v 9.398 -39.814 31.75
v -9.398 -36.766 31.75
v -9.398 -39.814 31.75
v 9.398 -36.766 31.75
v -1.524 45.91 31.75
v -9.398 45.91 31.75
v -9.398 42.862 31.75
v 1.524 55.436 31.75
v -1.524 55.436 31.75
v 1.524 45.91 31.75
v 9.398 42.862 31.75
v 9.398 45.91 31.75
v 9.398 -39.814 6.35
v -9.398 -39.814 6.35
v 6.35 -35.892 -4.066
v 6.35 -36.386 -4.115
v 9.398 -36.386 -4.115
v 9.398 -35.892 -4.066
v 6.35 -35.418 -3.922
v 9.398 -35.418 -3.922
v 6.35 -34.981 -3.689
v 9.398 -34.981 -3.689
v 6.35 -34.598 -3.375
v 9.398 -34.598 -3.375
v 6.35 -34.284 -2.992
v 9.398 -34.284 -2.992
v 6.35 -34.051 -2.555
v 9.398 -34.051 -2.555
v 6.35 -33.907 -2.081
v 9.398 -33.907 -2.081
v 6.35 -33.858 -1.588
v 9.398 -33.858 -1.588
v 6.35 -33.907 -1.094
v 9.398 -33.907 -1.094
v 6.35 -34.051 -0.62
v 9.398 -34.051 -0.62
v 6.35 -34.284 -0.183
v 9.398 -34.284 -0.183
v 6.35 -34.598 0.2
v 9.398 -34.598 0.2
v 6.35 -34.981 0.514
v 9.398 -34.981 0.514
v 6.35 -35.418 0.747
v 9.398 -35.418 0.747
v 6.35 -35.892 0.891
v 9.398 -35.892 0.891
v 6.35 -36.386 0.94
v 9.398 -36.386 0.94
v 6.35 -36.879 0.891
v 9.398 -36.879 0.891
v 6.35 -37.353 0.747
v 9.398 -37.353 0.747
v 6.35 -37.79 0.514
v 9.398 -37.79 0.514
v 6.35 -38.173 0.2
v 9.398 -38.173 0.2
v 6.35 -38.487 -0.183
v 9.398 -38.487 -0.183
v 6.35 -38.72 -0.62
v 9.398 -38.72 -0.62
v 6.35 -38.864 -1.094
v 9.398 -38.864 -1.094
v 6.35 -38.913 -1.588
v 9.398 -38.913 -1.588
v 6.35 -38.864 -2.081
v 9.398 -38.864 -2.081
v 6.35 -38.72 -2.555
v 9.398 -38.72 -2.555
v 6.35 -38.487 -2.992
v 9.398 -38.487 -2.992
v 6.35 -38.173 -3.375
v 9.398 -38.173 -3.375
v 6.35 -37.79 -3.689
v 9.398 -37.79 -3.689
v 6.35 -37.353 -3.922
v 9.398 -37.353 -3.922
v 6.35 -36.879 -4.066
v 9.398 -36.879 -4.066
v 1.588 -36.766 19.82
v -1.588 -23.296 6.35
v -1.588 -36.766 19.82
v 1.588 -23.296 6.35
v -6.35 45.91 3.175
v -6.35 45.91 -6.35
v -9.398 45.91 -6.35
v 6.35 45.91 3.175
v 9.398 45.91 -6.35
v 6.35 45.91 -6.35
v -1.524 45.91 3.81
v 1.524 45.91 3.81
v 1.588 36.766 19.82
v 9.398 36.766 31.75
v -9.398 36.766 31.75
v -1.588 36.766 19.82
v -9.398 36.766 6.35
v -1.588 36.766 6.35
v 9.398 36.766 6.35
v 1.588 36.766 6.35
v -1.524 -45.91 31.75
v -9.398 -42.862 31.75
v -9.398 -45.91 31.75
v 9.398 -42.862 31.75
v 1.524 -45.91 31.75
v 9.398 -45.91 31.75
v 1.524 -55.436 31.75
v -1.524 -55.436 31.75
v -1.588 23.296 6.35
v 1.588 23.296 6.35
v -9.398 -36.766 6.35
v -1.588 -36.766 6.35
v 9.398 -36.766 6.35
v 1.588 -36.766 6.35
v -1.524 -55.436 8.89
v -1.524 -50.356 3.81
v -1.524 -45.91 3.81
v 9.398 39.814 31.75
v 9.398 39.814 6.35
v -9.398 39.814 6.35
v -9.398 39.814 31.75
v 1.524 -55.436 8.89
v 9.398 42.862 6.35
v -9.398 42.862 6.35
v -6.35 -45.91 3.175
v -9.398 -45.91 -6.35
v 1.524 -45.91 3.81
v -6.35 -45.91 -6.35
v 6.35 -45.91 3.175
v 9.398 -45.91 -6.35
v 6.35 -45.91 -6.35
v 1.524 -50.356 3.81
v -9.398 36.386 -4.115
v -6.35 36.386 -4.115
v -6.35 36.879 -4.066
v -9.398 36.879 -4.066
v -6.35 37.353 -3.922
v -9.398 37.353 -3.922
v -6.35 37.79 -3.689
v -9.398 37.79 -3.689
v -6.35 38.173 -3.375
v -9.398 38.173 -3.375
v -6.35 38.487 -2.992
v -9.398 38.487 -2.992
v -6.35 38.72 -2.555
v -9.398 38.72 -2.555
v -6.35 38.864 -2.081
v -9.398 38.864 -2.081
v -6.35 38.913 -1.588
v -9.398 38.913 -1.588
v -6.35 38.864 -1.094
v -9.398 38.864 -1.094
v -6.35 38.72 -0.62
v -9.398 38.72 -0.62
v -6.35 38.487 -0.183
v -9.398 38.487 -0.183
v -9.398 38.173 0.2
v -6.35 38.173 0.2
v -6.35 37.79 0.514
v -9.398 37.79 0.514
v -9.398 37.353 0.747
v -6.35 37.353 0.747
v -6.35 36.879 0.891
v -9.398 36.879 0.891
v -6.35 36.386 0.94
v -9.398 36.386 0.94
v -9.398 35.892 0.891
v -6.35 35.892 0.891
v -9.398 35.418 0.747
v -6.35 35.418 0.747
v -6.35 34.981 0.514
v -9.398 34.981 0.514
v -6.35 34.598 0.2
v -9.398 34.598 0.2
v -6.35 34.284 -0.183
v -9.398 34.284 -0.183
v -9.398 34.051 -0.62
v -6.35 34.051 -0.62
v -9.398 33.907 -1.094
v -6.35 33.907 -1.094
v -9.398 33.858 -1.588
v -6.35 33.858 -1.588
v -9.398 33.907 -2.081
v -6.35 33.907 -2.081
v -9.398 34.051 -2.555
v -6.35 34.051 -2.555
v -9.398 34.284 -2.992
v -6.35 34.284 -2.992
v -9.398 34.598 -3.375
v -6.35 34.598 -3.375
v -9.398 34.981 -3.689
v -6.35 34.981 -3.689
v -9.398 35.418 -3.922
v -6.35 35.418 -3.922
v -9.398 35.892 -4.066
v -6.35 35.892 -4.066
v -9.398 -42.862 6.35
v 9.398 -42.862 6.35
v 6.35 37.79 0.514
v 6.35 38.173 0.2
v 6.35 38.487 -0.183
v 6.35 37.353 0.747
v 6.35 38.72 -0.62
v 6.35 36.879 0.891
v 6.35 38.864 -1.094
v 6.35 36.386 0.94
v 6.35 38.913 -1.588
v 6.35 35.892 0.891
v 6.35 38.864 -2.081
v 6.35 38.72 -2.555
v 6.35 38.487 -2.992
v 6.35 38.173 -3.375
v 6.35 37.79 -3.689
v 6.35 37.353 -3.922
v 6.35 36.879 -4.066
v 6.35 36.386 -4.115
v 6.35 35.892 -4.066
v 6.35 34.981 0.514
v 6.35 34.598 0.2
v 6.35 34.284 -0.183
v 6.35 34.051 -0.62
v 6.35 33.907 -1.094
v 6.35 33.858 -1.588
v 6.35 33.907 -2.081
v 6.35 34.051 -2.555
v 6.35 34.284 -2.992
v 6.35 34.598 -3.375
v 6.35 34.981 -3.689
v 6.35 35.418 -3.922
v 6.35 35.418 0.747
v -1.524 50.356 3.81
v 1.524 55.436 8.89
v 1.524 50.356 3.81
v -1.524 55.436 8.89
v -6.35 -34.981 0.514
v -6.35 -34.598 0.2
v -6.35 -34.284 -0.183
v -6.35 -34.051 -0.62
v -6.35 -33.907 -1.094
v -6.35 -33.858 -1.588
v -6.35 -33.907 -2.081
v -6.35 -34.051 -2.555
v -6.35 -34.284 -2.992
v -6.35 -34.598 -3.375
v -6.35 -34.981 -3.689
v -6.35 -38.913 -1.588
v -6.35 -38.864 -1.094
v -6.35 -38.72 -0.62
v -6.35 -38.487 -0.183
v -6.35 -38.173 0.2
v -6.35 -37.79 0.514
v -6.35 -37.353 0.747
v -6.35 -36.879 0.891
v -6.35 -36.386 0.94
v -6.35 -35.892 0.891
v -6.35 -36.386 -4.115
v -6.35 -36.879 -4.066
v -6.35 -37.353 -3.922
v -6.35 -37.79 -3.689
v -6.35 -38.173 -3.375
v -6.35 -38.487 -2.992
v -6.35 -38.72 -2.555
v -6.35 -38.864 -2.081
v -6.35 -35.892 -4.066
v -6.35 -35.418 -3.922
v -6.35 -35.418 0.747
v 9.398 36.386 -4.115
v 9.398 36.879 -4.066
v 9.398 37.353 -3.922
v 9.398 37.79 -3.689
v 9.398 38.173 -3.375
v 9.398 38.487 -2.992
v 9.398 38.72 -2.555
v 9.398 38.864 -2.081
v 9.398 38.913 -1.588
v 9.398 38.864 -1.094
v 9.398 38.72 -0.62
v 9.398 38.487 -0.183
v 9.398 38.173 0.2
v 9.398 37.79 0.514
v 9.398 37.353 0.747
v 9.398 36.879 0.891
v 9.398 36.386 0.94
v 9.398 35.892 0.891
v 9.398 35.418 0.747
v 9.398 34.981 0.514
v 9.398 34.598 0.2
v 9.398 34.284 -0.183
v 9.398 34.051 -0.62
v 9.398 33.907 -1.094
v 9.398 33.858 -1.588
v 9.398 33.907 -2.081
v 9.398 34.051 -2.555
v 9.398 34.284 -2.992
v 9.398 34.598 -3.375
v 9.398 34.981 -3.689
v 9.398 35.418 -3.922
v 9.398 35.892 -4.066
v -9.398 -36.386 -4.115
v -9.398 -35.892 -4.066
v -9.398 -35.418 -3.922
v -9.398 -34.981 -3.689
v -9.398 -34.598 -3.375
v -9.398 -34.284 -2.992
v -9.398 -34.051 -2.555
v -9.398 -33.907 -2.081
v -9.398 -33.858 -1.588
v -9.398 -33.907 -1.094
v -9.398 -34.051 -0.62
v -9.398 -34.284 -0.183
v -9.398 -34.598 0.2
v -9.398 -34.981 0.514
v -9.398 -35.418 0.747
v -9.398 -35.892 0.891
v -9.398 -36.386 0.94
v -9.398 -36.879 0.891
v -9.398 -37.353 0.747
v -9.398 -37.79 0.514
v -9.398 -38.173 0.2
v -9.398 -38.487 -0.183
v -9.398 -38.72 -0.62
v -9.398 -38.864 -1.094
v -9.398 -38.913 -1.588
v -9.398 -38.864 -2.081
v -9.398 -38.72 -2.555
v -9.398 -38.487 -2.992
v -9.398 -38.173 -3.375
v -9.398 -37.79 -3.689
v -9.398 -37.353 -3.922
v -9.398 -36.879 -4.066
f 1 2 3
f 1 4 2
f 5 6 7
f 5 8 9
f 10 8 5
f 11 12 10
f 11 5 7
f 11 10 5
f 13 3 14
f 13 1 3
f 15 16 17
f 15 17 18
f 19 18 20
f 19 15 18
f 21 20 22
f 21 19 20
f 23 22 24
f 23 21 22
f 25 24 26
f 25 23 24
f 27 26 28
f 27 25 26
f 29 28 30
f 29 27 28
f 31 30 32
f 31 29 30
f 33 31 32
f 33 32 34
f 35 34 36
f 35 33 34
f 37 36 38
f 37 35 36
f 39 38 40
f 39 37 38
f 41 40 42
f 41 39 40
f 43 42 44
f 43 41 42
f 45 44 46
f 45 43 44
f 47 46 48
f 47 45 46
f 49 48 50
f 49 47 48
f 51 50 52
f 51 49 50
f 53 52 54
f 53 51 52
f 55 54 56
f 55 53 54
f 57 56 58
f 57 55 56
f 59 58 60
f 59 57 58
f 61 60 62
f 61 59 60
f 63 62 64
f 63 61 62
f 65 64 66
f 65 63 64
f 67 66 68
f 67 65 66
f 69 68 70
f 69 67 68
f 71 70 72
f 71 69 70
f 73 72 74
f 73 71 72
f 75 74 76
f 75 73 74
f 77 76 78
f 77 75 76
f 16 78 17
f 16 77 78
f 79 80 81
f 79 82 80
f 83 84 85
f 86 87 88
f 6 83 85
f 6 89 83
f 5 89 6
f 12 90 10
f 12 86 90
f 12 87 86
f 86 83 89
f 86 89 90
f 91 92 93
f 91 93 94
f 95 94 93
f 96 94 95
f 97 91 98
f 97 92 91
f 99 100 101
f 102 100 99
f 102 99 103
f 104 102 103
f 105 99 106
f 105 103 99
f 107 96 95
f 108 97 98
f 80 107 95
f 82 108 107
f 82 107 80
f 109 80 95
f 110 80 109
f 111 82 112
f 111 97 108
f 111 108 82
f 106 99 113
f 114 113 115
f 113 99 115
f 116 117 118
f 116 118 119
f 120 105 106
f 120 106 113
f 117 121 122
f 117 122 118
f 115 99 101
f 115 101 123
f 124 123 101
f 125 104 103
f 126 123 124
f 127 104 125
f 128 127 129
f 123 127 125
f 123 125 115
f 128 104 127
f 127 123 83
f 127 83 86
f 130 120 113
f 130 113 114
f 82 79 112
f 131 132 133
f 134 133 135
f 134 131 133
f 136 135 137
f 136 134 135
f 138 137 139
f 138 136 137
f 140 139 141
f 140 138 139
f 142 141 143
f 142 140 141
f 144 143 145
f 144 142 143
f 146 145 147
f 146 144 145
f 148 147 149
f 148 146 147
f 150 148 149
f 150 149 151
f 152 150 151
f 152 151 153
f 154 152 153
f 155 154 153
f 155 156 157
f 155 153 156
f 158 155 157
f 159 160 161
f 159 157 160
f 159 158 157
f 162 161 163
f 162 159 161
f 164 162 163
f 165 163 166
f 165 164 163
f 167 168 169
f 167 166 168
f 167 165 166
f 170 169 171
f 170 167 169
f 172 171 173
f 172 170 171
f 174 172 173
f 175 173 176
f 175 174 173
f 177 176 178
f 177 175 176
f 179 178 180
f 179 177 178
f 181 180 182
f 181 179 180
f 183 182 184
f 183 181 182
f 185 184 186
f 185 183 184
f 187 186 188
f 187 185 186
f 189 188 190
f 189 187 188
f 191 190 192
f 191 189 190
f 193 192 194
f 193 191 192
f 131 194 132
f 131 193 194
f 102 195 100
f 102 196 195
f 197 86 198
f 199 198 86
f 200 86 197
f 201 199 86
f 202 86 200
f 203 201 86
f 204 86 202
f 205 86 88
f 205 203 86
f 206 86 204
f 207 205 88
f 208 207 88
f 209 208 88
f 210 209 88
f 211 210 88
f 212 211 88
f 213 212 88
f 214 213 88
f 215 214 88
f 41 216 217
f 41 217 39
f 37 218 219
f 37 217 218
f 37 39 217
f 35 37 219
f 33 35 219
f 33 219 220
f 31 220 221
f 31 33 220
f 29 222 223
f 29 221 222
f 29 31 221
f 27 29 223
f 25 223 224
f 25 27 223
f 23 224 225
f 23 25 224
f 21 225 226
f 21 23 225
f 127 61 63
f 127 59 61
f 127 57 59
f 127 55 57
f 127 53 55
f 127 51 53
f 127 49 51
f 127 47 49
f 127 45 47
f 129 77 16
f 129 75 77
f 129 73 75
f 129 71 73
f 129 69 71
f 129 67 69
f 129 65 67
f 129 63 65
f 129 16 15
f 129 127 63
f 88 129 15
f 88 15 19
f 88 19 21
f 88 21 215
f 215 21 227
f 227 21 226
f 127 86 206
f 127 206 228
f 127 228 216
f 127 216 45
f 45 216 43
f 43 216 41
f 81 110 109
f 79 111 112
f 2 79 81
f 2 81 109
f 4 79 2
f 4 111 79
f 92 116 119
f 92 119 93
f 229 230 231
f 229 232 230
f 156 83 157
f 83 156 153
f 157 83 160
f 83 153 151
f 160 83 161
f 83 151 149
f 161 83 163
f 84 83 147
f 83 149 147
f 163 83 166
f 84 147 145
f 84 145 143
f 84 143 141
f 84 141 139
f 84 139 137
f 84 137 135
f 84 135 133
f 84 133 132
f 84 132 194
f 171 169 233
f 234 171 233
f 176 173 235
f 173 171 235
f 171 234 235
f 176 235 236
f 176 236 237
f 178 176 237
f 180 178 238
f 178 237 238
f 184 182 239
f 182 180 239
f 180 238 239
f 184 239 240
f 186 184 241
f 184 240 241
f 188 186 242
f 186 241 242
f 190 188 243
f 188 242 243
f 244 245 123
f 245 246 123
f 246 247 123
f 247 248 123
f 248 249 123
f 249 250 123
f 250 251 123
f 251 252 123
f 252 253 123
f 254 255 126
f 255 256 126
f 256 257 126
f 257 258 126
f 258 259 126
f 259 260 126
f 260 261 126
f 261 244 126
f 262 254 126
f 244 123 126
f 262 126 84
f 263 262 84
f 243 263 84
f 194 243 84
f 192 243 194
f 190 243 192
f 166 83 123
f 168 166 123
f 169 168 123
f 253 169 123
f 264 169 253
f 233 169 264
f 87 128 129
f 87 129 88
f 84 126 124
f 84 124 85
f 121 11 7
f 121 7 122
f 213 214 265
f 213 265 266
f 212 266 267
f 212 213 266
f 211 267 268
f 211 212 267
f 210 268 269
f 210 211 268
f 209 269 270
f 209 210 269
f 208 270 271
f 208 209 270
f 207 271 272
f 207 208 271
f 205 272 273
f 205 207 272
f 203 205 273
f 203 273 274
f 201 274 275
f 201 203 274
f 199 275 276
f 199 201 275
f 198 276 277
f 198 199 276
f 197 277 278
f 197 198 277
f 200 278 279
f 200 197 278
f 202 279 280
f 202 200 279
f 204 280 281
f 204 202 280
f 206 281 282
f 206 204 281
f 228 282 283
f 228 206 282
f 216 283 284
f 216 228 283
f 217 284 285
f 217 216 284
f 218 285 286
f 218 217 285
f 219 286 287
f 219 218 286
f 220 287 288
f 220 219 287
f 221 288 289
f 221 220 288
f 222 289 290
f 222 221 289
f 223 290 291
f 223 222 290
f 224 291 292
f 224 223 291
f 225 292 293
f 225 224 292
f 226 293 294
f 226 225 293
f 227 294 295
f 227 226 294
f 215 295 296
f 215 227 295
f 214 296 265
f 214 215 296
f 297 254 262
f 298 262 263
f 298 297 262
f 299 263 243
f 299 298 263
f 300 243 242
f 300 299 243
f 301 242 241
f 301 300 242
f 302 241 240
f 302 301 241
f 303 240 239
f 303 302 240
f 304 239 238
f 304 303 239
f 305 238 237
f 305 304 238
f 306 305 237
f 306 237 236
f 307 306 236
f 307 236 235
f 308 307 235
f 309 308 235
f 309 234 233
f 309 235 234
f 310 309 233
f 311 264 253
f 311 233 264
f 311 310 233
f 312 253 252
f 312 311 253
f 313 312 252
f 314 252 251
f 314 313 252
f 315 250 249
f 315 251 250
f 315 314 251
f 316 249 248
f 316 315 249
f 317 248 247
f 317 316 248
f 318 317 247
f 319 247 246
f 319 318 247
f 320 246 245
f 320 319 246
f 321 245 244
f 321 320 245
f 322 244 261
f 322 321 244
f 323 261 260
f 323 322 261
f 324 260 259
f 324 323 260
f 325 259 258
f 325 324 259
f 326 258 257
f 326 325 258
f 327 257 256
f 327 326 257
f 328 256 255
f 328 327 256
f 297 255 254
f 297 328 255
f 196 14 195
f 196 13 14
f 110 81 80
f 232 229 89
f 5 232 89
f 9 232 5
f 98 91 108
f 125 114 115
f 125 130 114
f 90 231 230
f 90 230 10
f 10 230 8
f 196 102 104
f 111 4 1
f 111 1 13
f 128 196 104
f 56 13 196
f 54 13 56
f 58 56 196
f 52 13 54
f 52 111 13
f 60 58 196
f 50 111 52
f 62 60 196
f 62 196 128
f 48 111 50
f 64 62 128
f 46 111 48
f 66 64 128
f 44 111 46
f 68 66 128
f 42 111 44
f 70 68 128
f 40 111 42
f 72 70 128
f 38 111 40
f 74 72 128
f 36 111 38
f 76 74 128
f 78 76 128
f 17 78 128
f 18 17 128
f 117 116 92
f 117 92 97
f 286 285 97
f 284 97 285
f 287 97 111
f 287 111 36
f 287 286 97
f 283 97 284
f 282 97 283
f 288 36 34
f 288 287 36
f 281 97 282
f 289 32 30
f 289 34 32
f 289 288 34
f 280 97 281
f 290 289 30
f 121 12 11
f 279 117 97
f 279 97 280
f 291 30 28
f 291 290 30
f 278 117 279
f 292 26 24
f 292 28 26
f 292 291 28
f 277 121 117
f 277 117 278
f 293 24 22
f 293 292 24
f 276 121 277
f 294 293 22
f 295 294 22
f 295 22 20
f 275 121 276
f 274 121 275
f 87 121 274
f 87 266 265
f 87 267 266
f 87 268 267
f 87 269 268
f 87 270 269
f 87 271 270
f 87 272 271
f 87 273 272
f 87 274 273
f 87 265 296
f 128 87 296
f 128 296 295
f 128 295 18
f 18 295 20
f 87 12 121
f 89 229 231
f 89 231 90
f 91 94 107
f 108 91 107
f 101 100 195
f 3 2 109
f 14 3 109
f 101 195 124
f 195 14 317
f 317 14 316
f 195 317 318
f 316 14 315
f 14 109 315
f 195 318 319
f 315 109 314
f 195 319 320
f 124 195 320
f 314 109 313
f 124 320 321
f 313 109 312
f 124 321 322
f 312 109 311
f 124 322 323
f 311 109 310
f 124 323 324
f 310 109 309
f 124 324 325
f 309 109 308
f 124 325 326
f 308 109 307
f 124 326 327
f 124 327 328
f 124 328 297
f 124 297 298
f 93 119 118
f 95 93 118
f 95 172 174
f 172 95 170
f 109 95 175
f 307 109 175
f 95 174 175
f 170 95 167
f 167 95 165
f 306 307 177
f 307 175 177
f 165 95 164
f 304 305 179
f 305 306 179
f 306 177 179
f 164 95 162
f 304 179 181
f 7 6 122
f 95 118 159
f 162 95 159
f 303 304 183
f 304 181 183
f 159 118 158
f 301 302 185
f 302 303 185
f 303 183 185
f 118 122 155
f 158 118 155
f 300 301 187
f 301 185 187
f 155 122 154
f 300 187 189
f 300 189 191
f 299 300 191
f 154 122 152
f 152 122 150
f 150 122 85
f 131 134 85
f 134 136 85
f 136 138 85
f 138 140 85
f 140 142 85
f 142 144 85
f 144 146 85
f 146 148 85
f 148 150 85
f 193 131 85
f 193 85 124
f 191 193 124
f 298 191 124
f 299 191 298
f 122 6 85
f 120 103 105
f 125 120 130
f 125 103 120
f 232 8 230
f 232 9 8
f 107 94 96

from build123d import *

# Parameters (mm, degrees)
SKETCH1_R               = 2.5273
BOSS_EXTRUDE2_DEPTH     = 9.398
BOSS_EXTRUDE3_DEPTH     = 1.524
BOSS_EXTRUDE4_DEPTH     = 1.5875
SKETCH4_W               = 12.7
SKETCH4_H               = 9.525
CUT_EXTRUDE1_DEPTH      = 56.4355
CUT_EXTRUDE1_DEPTH_BACK = 56.4355


with BuildPart() as part:
    # Sketch1 → Boss-Extrude2 (new body, symmetric)
    with BuildSketch(Plane(origin=(0, 0, 0), x_dir=(0, 0, -1), z_dir=(1, 0, 0))):
        Polygon((-6.35, -45.9105), (6.35, -45.9105), (6.35, 45.9105), (-6.35, 45.9105), (-31.75, 45.9105), (-31.75, 42.8625), (-6.35, 42.8625), (-6.35, 39.8145), (-31.75, 39.8145), (-31.75, 36.7665), (-6.35, 36.7665), (-6.35, -36.7665), (-31.75, -36.7665), (-31.75, -39.8145), (-6.35, -39.8145), (-6.35, -42.8625), (-31.75, -42.8625), (-31.75, -45.9105), align=None)
        with Locations((1.5875, 36.3855)):
            Circle(SKETCH1_R, mode=Mode.SUBTRACT)
        with Locations((1.5875, -36.3855)):
            Circle(SKETCH1_R, mode=Mode.SUBTRACT)
    extrude(amount=BOSS_EXTRUDE2_DEPTH, both=True)

    # Sketch2 → Boss-Extrude3 (add, symmetric)
    with BuildSketch(Plane(origin=(0, 0, 0), x_dir=(0, 0, -1), z_dir=(1, 0, 0))):
        Polygon((-8.89, 55.4355), (-3.81, 50.3555), (-3.81, 45.9105), (-31.75, 45.9105), (-31.75, 55.4355), align=None)
        Polygon((-31.75, -45.9105), (-31.75, -55.4355), (-8.89, -55.4355), (-3.81, -50.3555), (-3.81, -45.9105), align=None)
    extrude(amount=BOSS_EXTRUDE3_DEPTH, both=True)

    # Sketch3 → Boss-Extrude4 (add, symmetric)
    with BuildSketch(Plane(origin=(0, 0, 0), x_dir=(0, 0, -1), z_dir=(1, 0, 0))):
        Polygon((-19.820384182, 36.7665), (-6.35, 23.296115818), (-6.35, 36.7665), align=None)
        Polygon((-19.820384182, -36.7665), (-6.35, -36.7665), (-6.35, -23.296115818), align=None)
    extrude(amount=BOSS_EXTRUDE4_DEPTH, both=True)

    # Sketch4 → Cut-Extrude1 (cut, two sides)
    with BuildSketch(Plane(origin=(0, 0, 0), x_dir=(1, 0, 0), z_dir=(0, 1, 0))) as cut_extrude1_sk:
        with Locations((0, 1.5875)):
            Rectangle(SKETCH4_W, SKETCH4_H)
    extrude(amount=CUT_EXTRUDE1_DEPTH, mode=Mode.SUBTRACT)
    extrude(cut_extrude1_sk.sketch, amount=-CUT_EXTRUDE1_DEPTH_BACK, mode=Mode.SUBTRACT)


solid = part.part
